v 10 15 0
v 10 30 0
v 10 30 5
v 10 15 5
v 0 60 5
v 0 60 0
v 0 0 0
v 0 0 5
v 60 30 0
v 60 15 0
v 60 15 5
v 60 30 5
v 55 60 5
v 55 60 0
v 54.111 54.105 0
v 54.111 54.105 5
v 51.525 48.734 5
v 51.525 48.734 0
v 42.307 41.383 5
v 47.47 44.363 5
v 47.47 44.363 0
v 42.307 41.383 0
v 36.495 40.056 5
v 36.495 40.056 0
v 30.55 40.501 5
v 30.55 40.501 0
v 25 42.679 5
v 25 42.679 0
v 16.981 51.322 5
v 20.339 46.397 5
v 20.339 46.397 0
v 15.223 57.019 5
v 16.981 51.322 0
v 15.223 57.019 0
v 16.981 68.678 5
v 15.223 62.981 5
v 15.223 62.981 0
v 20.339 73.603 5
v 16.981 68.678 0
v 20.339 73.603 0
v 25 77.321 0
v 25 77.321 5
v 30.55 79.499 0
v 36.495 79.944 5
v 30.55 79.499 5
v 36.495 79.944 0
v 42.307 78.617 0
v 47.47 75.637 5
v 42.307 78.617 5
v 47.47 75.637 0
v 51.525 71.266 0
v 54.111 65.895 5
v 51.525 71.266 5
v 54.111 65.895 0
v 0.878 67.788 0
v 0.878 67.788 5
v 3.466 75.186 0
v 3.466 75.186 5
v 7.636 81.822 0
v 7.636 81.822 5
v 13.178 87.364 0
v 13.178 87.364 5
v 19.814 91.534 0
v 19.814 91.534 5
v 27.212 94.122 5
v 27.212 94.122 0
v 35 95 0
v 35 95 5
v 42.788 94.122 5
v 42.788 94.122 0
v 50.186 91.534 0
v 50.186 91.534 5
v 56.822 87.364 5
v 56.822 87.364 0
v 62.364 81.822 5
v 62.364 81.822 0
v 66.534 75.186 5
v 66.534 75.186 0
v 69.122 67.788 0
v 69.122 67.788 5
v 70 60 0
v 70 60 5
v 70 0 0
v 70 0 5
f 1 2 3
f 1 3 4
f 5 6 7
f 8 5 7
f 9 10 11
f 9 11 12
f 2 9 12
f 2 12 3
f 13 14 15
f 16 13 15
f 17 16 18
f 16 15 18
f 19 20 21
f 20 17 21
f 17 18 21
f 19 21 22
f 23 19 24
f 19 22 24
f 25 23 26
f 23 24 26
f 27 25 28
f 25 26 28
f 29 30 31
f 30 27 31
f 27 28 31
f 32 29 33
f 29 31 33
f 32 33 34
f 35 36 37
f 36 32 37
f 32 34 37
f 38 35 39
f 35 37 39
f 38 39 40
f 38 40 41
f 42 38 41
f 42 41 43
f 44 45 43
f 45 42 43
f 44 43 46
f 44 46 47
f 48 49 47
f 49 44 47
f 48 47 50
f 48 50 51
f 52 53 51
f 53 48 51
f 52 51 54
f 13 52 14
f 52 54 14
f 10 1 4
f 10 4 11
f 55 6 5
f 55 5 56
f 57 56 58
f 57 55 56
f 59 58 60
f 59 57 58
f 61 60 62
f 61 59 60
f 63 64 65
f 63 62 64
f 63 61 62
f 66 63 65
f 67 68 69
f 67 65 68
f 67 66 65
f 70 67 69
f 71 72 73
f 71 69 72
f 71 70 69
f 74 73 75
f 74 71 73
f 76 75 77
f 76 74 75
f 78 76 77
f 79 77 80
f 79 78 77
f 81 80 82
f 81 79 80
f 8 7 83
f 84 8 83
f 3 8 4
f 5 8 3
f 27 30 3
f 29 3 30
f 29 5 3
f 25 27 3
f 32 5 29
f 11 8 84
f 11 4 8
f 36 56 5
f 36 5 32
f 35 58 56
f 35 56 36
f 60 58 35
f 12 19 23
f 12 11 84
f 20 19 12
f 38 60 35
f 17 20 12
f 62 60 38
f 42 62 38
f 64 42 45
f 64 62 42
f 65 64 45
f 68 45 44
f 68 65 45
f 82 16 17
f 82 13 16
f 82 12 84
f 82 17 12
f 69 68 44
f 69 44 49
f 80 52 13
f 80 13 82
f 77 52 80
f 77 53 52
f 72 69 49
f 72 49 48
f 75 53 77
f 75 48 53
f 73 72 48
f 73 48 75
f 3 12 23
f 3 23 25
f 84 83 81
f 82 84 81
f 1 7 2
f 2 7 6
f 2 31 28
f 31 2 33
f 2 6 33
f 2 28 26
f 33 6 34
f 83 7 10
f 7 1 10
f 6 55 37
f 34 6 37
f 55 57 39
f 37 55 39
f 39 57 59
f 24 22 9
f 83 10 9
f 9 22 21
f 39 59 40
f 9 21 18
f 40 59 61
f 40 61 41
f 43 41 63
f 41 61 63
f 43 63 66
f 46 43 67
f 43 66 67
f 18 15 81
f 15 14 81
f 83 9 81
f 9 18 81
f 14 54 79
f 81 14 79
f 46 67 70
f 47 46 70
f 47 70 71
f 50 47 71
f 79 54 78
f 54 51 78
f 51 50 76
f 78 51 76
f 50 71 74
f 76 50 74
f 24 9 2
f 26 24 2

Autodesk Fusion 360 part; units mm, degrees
sketch "Sketch1" plane through (0, 0, 0) normal (0, 0, 1) x (1, 0, 0)
  line L0 (0, 0) -> (70, 0)
  line L1 (70, 0) -> (70, 60)
  line L2 (0, 60) -> (0, 0)
  line L3 (10, 15) -> (60, 15)
  line L4 (60, 15) -> (60, 30)
  line L5 (60, 30) -> (10, 30)
  line L6 (10, 30) -> (10, 15)
  circle A0 centre (35, 60) radius 20
  arc A1 (70, 60) -> (0, 60) centre (35, 60) ccw
  dimension "d1" = 70
  dimension "d2" = 60
  dimension "d5" = 15
  dimension "d6" = 50
  dimension "d10" = 10
  dimension "d11" = 15
  dimension "d15" = 40
  dimension "d16" = 35
extrude "Extrude1" add sketch "Sketch1" along normal blind 5
